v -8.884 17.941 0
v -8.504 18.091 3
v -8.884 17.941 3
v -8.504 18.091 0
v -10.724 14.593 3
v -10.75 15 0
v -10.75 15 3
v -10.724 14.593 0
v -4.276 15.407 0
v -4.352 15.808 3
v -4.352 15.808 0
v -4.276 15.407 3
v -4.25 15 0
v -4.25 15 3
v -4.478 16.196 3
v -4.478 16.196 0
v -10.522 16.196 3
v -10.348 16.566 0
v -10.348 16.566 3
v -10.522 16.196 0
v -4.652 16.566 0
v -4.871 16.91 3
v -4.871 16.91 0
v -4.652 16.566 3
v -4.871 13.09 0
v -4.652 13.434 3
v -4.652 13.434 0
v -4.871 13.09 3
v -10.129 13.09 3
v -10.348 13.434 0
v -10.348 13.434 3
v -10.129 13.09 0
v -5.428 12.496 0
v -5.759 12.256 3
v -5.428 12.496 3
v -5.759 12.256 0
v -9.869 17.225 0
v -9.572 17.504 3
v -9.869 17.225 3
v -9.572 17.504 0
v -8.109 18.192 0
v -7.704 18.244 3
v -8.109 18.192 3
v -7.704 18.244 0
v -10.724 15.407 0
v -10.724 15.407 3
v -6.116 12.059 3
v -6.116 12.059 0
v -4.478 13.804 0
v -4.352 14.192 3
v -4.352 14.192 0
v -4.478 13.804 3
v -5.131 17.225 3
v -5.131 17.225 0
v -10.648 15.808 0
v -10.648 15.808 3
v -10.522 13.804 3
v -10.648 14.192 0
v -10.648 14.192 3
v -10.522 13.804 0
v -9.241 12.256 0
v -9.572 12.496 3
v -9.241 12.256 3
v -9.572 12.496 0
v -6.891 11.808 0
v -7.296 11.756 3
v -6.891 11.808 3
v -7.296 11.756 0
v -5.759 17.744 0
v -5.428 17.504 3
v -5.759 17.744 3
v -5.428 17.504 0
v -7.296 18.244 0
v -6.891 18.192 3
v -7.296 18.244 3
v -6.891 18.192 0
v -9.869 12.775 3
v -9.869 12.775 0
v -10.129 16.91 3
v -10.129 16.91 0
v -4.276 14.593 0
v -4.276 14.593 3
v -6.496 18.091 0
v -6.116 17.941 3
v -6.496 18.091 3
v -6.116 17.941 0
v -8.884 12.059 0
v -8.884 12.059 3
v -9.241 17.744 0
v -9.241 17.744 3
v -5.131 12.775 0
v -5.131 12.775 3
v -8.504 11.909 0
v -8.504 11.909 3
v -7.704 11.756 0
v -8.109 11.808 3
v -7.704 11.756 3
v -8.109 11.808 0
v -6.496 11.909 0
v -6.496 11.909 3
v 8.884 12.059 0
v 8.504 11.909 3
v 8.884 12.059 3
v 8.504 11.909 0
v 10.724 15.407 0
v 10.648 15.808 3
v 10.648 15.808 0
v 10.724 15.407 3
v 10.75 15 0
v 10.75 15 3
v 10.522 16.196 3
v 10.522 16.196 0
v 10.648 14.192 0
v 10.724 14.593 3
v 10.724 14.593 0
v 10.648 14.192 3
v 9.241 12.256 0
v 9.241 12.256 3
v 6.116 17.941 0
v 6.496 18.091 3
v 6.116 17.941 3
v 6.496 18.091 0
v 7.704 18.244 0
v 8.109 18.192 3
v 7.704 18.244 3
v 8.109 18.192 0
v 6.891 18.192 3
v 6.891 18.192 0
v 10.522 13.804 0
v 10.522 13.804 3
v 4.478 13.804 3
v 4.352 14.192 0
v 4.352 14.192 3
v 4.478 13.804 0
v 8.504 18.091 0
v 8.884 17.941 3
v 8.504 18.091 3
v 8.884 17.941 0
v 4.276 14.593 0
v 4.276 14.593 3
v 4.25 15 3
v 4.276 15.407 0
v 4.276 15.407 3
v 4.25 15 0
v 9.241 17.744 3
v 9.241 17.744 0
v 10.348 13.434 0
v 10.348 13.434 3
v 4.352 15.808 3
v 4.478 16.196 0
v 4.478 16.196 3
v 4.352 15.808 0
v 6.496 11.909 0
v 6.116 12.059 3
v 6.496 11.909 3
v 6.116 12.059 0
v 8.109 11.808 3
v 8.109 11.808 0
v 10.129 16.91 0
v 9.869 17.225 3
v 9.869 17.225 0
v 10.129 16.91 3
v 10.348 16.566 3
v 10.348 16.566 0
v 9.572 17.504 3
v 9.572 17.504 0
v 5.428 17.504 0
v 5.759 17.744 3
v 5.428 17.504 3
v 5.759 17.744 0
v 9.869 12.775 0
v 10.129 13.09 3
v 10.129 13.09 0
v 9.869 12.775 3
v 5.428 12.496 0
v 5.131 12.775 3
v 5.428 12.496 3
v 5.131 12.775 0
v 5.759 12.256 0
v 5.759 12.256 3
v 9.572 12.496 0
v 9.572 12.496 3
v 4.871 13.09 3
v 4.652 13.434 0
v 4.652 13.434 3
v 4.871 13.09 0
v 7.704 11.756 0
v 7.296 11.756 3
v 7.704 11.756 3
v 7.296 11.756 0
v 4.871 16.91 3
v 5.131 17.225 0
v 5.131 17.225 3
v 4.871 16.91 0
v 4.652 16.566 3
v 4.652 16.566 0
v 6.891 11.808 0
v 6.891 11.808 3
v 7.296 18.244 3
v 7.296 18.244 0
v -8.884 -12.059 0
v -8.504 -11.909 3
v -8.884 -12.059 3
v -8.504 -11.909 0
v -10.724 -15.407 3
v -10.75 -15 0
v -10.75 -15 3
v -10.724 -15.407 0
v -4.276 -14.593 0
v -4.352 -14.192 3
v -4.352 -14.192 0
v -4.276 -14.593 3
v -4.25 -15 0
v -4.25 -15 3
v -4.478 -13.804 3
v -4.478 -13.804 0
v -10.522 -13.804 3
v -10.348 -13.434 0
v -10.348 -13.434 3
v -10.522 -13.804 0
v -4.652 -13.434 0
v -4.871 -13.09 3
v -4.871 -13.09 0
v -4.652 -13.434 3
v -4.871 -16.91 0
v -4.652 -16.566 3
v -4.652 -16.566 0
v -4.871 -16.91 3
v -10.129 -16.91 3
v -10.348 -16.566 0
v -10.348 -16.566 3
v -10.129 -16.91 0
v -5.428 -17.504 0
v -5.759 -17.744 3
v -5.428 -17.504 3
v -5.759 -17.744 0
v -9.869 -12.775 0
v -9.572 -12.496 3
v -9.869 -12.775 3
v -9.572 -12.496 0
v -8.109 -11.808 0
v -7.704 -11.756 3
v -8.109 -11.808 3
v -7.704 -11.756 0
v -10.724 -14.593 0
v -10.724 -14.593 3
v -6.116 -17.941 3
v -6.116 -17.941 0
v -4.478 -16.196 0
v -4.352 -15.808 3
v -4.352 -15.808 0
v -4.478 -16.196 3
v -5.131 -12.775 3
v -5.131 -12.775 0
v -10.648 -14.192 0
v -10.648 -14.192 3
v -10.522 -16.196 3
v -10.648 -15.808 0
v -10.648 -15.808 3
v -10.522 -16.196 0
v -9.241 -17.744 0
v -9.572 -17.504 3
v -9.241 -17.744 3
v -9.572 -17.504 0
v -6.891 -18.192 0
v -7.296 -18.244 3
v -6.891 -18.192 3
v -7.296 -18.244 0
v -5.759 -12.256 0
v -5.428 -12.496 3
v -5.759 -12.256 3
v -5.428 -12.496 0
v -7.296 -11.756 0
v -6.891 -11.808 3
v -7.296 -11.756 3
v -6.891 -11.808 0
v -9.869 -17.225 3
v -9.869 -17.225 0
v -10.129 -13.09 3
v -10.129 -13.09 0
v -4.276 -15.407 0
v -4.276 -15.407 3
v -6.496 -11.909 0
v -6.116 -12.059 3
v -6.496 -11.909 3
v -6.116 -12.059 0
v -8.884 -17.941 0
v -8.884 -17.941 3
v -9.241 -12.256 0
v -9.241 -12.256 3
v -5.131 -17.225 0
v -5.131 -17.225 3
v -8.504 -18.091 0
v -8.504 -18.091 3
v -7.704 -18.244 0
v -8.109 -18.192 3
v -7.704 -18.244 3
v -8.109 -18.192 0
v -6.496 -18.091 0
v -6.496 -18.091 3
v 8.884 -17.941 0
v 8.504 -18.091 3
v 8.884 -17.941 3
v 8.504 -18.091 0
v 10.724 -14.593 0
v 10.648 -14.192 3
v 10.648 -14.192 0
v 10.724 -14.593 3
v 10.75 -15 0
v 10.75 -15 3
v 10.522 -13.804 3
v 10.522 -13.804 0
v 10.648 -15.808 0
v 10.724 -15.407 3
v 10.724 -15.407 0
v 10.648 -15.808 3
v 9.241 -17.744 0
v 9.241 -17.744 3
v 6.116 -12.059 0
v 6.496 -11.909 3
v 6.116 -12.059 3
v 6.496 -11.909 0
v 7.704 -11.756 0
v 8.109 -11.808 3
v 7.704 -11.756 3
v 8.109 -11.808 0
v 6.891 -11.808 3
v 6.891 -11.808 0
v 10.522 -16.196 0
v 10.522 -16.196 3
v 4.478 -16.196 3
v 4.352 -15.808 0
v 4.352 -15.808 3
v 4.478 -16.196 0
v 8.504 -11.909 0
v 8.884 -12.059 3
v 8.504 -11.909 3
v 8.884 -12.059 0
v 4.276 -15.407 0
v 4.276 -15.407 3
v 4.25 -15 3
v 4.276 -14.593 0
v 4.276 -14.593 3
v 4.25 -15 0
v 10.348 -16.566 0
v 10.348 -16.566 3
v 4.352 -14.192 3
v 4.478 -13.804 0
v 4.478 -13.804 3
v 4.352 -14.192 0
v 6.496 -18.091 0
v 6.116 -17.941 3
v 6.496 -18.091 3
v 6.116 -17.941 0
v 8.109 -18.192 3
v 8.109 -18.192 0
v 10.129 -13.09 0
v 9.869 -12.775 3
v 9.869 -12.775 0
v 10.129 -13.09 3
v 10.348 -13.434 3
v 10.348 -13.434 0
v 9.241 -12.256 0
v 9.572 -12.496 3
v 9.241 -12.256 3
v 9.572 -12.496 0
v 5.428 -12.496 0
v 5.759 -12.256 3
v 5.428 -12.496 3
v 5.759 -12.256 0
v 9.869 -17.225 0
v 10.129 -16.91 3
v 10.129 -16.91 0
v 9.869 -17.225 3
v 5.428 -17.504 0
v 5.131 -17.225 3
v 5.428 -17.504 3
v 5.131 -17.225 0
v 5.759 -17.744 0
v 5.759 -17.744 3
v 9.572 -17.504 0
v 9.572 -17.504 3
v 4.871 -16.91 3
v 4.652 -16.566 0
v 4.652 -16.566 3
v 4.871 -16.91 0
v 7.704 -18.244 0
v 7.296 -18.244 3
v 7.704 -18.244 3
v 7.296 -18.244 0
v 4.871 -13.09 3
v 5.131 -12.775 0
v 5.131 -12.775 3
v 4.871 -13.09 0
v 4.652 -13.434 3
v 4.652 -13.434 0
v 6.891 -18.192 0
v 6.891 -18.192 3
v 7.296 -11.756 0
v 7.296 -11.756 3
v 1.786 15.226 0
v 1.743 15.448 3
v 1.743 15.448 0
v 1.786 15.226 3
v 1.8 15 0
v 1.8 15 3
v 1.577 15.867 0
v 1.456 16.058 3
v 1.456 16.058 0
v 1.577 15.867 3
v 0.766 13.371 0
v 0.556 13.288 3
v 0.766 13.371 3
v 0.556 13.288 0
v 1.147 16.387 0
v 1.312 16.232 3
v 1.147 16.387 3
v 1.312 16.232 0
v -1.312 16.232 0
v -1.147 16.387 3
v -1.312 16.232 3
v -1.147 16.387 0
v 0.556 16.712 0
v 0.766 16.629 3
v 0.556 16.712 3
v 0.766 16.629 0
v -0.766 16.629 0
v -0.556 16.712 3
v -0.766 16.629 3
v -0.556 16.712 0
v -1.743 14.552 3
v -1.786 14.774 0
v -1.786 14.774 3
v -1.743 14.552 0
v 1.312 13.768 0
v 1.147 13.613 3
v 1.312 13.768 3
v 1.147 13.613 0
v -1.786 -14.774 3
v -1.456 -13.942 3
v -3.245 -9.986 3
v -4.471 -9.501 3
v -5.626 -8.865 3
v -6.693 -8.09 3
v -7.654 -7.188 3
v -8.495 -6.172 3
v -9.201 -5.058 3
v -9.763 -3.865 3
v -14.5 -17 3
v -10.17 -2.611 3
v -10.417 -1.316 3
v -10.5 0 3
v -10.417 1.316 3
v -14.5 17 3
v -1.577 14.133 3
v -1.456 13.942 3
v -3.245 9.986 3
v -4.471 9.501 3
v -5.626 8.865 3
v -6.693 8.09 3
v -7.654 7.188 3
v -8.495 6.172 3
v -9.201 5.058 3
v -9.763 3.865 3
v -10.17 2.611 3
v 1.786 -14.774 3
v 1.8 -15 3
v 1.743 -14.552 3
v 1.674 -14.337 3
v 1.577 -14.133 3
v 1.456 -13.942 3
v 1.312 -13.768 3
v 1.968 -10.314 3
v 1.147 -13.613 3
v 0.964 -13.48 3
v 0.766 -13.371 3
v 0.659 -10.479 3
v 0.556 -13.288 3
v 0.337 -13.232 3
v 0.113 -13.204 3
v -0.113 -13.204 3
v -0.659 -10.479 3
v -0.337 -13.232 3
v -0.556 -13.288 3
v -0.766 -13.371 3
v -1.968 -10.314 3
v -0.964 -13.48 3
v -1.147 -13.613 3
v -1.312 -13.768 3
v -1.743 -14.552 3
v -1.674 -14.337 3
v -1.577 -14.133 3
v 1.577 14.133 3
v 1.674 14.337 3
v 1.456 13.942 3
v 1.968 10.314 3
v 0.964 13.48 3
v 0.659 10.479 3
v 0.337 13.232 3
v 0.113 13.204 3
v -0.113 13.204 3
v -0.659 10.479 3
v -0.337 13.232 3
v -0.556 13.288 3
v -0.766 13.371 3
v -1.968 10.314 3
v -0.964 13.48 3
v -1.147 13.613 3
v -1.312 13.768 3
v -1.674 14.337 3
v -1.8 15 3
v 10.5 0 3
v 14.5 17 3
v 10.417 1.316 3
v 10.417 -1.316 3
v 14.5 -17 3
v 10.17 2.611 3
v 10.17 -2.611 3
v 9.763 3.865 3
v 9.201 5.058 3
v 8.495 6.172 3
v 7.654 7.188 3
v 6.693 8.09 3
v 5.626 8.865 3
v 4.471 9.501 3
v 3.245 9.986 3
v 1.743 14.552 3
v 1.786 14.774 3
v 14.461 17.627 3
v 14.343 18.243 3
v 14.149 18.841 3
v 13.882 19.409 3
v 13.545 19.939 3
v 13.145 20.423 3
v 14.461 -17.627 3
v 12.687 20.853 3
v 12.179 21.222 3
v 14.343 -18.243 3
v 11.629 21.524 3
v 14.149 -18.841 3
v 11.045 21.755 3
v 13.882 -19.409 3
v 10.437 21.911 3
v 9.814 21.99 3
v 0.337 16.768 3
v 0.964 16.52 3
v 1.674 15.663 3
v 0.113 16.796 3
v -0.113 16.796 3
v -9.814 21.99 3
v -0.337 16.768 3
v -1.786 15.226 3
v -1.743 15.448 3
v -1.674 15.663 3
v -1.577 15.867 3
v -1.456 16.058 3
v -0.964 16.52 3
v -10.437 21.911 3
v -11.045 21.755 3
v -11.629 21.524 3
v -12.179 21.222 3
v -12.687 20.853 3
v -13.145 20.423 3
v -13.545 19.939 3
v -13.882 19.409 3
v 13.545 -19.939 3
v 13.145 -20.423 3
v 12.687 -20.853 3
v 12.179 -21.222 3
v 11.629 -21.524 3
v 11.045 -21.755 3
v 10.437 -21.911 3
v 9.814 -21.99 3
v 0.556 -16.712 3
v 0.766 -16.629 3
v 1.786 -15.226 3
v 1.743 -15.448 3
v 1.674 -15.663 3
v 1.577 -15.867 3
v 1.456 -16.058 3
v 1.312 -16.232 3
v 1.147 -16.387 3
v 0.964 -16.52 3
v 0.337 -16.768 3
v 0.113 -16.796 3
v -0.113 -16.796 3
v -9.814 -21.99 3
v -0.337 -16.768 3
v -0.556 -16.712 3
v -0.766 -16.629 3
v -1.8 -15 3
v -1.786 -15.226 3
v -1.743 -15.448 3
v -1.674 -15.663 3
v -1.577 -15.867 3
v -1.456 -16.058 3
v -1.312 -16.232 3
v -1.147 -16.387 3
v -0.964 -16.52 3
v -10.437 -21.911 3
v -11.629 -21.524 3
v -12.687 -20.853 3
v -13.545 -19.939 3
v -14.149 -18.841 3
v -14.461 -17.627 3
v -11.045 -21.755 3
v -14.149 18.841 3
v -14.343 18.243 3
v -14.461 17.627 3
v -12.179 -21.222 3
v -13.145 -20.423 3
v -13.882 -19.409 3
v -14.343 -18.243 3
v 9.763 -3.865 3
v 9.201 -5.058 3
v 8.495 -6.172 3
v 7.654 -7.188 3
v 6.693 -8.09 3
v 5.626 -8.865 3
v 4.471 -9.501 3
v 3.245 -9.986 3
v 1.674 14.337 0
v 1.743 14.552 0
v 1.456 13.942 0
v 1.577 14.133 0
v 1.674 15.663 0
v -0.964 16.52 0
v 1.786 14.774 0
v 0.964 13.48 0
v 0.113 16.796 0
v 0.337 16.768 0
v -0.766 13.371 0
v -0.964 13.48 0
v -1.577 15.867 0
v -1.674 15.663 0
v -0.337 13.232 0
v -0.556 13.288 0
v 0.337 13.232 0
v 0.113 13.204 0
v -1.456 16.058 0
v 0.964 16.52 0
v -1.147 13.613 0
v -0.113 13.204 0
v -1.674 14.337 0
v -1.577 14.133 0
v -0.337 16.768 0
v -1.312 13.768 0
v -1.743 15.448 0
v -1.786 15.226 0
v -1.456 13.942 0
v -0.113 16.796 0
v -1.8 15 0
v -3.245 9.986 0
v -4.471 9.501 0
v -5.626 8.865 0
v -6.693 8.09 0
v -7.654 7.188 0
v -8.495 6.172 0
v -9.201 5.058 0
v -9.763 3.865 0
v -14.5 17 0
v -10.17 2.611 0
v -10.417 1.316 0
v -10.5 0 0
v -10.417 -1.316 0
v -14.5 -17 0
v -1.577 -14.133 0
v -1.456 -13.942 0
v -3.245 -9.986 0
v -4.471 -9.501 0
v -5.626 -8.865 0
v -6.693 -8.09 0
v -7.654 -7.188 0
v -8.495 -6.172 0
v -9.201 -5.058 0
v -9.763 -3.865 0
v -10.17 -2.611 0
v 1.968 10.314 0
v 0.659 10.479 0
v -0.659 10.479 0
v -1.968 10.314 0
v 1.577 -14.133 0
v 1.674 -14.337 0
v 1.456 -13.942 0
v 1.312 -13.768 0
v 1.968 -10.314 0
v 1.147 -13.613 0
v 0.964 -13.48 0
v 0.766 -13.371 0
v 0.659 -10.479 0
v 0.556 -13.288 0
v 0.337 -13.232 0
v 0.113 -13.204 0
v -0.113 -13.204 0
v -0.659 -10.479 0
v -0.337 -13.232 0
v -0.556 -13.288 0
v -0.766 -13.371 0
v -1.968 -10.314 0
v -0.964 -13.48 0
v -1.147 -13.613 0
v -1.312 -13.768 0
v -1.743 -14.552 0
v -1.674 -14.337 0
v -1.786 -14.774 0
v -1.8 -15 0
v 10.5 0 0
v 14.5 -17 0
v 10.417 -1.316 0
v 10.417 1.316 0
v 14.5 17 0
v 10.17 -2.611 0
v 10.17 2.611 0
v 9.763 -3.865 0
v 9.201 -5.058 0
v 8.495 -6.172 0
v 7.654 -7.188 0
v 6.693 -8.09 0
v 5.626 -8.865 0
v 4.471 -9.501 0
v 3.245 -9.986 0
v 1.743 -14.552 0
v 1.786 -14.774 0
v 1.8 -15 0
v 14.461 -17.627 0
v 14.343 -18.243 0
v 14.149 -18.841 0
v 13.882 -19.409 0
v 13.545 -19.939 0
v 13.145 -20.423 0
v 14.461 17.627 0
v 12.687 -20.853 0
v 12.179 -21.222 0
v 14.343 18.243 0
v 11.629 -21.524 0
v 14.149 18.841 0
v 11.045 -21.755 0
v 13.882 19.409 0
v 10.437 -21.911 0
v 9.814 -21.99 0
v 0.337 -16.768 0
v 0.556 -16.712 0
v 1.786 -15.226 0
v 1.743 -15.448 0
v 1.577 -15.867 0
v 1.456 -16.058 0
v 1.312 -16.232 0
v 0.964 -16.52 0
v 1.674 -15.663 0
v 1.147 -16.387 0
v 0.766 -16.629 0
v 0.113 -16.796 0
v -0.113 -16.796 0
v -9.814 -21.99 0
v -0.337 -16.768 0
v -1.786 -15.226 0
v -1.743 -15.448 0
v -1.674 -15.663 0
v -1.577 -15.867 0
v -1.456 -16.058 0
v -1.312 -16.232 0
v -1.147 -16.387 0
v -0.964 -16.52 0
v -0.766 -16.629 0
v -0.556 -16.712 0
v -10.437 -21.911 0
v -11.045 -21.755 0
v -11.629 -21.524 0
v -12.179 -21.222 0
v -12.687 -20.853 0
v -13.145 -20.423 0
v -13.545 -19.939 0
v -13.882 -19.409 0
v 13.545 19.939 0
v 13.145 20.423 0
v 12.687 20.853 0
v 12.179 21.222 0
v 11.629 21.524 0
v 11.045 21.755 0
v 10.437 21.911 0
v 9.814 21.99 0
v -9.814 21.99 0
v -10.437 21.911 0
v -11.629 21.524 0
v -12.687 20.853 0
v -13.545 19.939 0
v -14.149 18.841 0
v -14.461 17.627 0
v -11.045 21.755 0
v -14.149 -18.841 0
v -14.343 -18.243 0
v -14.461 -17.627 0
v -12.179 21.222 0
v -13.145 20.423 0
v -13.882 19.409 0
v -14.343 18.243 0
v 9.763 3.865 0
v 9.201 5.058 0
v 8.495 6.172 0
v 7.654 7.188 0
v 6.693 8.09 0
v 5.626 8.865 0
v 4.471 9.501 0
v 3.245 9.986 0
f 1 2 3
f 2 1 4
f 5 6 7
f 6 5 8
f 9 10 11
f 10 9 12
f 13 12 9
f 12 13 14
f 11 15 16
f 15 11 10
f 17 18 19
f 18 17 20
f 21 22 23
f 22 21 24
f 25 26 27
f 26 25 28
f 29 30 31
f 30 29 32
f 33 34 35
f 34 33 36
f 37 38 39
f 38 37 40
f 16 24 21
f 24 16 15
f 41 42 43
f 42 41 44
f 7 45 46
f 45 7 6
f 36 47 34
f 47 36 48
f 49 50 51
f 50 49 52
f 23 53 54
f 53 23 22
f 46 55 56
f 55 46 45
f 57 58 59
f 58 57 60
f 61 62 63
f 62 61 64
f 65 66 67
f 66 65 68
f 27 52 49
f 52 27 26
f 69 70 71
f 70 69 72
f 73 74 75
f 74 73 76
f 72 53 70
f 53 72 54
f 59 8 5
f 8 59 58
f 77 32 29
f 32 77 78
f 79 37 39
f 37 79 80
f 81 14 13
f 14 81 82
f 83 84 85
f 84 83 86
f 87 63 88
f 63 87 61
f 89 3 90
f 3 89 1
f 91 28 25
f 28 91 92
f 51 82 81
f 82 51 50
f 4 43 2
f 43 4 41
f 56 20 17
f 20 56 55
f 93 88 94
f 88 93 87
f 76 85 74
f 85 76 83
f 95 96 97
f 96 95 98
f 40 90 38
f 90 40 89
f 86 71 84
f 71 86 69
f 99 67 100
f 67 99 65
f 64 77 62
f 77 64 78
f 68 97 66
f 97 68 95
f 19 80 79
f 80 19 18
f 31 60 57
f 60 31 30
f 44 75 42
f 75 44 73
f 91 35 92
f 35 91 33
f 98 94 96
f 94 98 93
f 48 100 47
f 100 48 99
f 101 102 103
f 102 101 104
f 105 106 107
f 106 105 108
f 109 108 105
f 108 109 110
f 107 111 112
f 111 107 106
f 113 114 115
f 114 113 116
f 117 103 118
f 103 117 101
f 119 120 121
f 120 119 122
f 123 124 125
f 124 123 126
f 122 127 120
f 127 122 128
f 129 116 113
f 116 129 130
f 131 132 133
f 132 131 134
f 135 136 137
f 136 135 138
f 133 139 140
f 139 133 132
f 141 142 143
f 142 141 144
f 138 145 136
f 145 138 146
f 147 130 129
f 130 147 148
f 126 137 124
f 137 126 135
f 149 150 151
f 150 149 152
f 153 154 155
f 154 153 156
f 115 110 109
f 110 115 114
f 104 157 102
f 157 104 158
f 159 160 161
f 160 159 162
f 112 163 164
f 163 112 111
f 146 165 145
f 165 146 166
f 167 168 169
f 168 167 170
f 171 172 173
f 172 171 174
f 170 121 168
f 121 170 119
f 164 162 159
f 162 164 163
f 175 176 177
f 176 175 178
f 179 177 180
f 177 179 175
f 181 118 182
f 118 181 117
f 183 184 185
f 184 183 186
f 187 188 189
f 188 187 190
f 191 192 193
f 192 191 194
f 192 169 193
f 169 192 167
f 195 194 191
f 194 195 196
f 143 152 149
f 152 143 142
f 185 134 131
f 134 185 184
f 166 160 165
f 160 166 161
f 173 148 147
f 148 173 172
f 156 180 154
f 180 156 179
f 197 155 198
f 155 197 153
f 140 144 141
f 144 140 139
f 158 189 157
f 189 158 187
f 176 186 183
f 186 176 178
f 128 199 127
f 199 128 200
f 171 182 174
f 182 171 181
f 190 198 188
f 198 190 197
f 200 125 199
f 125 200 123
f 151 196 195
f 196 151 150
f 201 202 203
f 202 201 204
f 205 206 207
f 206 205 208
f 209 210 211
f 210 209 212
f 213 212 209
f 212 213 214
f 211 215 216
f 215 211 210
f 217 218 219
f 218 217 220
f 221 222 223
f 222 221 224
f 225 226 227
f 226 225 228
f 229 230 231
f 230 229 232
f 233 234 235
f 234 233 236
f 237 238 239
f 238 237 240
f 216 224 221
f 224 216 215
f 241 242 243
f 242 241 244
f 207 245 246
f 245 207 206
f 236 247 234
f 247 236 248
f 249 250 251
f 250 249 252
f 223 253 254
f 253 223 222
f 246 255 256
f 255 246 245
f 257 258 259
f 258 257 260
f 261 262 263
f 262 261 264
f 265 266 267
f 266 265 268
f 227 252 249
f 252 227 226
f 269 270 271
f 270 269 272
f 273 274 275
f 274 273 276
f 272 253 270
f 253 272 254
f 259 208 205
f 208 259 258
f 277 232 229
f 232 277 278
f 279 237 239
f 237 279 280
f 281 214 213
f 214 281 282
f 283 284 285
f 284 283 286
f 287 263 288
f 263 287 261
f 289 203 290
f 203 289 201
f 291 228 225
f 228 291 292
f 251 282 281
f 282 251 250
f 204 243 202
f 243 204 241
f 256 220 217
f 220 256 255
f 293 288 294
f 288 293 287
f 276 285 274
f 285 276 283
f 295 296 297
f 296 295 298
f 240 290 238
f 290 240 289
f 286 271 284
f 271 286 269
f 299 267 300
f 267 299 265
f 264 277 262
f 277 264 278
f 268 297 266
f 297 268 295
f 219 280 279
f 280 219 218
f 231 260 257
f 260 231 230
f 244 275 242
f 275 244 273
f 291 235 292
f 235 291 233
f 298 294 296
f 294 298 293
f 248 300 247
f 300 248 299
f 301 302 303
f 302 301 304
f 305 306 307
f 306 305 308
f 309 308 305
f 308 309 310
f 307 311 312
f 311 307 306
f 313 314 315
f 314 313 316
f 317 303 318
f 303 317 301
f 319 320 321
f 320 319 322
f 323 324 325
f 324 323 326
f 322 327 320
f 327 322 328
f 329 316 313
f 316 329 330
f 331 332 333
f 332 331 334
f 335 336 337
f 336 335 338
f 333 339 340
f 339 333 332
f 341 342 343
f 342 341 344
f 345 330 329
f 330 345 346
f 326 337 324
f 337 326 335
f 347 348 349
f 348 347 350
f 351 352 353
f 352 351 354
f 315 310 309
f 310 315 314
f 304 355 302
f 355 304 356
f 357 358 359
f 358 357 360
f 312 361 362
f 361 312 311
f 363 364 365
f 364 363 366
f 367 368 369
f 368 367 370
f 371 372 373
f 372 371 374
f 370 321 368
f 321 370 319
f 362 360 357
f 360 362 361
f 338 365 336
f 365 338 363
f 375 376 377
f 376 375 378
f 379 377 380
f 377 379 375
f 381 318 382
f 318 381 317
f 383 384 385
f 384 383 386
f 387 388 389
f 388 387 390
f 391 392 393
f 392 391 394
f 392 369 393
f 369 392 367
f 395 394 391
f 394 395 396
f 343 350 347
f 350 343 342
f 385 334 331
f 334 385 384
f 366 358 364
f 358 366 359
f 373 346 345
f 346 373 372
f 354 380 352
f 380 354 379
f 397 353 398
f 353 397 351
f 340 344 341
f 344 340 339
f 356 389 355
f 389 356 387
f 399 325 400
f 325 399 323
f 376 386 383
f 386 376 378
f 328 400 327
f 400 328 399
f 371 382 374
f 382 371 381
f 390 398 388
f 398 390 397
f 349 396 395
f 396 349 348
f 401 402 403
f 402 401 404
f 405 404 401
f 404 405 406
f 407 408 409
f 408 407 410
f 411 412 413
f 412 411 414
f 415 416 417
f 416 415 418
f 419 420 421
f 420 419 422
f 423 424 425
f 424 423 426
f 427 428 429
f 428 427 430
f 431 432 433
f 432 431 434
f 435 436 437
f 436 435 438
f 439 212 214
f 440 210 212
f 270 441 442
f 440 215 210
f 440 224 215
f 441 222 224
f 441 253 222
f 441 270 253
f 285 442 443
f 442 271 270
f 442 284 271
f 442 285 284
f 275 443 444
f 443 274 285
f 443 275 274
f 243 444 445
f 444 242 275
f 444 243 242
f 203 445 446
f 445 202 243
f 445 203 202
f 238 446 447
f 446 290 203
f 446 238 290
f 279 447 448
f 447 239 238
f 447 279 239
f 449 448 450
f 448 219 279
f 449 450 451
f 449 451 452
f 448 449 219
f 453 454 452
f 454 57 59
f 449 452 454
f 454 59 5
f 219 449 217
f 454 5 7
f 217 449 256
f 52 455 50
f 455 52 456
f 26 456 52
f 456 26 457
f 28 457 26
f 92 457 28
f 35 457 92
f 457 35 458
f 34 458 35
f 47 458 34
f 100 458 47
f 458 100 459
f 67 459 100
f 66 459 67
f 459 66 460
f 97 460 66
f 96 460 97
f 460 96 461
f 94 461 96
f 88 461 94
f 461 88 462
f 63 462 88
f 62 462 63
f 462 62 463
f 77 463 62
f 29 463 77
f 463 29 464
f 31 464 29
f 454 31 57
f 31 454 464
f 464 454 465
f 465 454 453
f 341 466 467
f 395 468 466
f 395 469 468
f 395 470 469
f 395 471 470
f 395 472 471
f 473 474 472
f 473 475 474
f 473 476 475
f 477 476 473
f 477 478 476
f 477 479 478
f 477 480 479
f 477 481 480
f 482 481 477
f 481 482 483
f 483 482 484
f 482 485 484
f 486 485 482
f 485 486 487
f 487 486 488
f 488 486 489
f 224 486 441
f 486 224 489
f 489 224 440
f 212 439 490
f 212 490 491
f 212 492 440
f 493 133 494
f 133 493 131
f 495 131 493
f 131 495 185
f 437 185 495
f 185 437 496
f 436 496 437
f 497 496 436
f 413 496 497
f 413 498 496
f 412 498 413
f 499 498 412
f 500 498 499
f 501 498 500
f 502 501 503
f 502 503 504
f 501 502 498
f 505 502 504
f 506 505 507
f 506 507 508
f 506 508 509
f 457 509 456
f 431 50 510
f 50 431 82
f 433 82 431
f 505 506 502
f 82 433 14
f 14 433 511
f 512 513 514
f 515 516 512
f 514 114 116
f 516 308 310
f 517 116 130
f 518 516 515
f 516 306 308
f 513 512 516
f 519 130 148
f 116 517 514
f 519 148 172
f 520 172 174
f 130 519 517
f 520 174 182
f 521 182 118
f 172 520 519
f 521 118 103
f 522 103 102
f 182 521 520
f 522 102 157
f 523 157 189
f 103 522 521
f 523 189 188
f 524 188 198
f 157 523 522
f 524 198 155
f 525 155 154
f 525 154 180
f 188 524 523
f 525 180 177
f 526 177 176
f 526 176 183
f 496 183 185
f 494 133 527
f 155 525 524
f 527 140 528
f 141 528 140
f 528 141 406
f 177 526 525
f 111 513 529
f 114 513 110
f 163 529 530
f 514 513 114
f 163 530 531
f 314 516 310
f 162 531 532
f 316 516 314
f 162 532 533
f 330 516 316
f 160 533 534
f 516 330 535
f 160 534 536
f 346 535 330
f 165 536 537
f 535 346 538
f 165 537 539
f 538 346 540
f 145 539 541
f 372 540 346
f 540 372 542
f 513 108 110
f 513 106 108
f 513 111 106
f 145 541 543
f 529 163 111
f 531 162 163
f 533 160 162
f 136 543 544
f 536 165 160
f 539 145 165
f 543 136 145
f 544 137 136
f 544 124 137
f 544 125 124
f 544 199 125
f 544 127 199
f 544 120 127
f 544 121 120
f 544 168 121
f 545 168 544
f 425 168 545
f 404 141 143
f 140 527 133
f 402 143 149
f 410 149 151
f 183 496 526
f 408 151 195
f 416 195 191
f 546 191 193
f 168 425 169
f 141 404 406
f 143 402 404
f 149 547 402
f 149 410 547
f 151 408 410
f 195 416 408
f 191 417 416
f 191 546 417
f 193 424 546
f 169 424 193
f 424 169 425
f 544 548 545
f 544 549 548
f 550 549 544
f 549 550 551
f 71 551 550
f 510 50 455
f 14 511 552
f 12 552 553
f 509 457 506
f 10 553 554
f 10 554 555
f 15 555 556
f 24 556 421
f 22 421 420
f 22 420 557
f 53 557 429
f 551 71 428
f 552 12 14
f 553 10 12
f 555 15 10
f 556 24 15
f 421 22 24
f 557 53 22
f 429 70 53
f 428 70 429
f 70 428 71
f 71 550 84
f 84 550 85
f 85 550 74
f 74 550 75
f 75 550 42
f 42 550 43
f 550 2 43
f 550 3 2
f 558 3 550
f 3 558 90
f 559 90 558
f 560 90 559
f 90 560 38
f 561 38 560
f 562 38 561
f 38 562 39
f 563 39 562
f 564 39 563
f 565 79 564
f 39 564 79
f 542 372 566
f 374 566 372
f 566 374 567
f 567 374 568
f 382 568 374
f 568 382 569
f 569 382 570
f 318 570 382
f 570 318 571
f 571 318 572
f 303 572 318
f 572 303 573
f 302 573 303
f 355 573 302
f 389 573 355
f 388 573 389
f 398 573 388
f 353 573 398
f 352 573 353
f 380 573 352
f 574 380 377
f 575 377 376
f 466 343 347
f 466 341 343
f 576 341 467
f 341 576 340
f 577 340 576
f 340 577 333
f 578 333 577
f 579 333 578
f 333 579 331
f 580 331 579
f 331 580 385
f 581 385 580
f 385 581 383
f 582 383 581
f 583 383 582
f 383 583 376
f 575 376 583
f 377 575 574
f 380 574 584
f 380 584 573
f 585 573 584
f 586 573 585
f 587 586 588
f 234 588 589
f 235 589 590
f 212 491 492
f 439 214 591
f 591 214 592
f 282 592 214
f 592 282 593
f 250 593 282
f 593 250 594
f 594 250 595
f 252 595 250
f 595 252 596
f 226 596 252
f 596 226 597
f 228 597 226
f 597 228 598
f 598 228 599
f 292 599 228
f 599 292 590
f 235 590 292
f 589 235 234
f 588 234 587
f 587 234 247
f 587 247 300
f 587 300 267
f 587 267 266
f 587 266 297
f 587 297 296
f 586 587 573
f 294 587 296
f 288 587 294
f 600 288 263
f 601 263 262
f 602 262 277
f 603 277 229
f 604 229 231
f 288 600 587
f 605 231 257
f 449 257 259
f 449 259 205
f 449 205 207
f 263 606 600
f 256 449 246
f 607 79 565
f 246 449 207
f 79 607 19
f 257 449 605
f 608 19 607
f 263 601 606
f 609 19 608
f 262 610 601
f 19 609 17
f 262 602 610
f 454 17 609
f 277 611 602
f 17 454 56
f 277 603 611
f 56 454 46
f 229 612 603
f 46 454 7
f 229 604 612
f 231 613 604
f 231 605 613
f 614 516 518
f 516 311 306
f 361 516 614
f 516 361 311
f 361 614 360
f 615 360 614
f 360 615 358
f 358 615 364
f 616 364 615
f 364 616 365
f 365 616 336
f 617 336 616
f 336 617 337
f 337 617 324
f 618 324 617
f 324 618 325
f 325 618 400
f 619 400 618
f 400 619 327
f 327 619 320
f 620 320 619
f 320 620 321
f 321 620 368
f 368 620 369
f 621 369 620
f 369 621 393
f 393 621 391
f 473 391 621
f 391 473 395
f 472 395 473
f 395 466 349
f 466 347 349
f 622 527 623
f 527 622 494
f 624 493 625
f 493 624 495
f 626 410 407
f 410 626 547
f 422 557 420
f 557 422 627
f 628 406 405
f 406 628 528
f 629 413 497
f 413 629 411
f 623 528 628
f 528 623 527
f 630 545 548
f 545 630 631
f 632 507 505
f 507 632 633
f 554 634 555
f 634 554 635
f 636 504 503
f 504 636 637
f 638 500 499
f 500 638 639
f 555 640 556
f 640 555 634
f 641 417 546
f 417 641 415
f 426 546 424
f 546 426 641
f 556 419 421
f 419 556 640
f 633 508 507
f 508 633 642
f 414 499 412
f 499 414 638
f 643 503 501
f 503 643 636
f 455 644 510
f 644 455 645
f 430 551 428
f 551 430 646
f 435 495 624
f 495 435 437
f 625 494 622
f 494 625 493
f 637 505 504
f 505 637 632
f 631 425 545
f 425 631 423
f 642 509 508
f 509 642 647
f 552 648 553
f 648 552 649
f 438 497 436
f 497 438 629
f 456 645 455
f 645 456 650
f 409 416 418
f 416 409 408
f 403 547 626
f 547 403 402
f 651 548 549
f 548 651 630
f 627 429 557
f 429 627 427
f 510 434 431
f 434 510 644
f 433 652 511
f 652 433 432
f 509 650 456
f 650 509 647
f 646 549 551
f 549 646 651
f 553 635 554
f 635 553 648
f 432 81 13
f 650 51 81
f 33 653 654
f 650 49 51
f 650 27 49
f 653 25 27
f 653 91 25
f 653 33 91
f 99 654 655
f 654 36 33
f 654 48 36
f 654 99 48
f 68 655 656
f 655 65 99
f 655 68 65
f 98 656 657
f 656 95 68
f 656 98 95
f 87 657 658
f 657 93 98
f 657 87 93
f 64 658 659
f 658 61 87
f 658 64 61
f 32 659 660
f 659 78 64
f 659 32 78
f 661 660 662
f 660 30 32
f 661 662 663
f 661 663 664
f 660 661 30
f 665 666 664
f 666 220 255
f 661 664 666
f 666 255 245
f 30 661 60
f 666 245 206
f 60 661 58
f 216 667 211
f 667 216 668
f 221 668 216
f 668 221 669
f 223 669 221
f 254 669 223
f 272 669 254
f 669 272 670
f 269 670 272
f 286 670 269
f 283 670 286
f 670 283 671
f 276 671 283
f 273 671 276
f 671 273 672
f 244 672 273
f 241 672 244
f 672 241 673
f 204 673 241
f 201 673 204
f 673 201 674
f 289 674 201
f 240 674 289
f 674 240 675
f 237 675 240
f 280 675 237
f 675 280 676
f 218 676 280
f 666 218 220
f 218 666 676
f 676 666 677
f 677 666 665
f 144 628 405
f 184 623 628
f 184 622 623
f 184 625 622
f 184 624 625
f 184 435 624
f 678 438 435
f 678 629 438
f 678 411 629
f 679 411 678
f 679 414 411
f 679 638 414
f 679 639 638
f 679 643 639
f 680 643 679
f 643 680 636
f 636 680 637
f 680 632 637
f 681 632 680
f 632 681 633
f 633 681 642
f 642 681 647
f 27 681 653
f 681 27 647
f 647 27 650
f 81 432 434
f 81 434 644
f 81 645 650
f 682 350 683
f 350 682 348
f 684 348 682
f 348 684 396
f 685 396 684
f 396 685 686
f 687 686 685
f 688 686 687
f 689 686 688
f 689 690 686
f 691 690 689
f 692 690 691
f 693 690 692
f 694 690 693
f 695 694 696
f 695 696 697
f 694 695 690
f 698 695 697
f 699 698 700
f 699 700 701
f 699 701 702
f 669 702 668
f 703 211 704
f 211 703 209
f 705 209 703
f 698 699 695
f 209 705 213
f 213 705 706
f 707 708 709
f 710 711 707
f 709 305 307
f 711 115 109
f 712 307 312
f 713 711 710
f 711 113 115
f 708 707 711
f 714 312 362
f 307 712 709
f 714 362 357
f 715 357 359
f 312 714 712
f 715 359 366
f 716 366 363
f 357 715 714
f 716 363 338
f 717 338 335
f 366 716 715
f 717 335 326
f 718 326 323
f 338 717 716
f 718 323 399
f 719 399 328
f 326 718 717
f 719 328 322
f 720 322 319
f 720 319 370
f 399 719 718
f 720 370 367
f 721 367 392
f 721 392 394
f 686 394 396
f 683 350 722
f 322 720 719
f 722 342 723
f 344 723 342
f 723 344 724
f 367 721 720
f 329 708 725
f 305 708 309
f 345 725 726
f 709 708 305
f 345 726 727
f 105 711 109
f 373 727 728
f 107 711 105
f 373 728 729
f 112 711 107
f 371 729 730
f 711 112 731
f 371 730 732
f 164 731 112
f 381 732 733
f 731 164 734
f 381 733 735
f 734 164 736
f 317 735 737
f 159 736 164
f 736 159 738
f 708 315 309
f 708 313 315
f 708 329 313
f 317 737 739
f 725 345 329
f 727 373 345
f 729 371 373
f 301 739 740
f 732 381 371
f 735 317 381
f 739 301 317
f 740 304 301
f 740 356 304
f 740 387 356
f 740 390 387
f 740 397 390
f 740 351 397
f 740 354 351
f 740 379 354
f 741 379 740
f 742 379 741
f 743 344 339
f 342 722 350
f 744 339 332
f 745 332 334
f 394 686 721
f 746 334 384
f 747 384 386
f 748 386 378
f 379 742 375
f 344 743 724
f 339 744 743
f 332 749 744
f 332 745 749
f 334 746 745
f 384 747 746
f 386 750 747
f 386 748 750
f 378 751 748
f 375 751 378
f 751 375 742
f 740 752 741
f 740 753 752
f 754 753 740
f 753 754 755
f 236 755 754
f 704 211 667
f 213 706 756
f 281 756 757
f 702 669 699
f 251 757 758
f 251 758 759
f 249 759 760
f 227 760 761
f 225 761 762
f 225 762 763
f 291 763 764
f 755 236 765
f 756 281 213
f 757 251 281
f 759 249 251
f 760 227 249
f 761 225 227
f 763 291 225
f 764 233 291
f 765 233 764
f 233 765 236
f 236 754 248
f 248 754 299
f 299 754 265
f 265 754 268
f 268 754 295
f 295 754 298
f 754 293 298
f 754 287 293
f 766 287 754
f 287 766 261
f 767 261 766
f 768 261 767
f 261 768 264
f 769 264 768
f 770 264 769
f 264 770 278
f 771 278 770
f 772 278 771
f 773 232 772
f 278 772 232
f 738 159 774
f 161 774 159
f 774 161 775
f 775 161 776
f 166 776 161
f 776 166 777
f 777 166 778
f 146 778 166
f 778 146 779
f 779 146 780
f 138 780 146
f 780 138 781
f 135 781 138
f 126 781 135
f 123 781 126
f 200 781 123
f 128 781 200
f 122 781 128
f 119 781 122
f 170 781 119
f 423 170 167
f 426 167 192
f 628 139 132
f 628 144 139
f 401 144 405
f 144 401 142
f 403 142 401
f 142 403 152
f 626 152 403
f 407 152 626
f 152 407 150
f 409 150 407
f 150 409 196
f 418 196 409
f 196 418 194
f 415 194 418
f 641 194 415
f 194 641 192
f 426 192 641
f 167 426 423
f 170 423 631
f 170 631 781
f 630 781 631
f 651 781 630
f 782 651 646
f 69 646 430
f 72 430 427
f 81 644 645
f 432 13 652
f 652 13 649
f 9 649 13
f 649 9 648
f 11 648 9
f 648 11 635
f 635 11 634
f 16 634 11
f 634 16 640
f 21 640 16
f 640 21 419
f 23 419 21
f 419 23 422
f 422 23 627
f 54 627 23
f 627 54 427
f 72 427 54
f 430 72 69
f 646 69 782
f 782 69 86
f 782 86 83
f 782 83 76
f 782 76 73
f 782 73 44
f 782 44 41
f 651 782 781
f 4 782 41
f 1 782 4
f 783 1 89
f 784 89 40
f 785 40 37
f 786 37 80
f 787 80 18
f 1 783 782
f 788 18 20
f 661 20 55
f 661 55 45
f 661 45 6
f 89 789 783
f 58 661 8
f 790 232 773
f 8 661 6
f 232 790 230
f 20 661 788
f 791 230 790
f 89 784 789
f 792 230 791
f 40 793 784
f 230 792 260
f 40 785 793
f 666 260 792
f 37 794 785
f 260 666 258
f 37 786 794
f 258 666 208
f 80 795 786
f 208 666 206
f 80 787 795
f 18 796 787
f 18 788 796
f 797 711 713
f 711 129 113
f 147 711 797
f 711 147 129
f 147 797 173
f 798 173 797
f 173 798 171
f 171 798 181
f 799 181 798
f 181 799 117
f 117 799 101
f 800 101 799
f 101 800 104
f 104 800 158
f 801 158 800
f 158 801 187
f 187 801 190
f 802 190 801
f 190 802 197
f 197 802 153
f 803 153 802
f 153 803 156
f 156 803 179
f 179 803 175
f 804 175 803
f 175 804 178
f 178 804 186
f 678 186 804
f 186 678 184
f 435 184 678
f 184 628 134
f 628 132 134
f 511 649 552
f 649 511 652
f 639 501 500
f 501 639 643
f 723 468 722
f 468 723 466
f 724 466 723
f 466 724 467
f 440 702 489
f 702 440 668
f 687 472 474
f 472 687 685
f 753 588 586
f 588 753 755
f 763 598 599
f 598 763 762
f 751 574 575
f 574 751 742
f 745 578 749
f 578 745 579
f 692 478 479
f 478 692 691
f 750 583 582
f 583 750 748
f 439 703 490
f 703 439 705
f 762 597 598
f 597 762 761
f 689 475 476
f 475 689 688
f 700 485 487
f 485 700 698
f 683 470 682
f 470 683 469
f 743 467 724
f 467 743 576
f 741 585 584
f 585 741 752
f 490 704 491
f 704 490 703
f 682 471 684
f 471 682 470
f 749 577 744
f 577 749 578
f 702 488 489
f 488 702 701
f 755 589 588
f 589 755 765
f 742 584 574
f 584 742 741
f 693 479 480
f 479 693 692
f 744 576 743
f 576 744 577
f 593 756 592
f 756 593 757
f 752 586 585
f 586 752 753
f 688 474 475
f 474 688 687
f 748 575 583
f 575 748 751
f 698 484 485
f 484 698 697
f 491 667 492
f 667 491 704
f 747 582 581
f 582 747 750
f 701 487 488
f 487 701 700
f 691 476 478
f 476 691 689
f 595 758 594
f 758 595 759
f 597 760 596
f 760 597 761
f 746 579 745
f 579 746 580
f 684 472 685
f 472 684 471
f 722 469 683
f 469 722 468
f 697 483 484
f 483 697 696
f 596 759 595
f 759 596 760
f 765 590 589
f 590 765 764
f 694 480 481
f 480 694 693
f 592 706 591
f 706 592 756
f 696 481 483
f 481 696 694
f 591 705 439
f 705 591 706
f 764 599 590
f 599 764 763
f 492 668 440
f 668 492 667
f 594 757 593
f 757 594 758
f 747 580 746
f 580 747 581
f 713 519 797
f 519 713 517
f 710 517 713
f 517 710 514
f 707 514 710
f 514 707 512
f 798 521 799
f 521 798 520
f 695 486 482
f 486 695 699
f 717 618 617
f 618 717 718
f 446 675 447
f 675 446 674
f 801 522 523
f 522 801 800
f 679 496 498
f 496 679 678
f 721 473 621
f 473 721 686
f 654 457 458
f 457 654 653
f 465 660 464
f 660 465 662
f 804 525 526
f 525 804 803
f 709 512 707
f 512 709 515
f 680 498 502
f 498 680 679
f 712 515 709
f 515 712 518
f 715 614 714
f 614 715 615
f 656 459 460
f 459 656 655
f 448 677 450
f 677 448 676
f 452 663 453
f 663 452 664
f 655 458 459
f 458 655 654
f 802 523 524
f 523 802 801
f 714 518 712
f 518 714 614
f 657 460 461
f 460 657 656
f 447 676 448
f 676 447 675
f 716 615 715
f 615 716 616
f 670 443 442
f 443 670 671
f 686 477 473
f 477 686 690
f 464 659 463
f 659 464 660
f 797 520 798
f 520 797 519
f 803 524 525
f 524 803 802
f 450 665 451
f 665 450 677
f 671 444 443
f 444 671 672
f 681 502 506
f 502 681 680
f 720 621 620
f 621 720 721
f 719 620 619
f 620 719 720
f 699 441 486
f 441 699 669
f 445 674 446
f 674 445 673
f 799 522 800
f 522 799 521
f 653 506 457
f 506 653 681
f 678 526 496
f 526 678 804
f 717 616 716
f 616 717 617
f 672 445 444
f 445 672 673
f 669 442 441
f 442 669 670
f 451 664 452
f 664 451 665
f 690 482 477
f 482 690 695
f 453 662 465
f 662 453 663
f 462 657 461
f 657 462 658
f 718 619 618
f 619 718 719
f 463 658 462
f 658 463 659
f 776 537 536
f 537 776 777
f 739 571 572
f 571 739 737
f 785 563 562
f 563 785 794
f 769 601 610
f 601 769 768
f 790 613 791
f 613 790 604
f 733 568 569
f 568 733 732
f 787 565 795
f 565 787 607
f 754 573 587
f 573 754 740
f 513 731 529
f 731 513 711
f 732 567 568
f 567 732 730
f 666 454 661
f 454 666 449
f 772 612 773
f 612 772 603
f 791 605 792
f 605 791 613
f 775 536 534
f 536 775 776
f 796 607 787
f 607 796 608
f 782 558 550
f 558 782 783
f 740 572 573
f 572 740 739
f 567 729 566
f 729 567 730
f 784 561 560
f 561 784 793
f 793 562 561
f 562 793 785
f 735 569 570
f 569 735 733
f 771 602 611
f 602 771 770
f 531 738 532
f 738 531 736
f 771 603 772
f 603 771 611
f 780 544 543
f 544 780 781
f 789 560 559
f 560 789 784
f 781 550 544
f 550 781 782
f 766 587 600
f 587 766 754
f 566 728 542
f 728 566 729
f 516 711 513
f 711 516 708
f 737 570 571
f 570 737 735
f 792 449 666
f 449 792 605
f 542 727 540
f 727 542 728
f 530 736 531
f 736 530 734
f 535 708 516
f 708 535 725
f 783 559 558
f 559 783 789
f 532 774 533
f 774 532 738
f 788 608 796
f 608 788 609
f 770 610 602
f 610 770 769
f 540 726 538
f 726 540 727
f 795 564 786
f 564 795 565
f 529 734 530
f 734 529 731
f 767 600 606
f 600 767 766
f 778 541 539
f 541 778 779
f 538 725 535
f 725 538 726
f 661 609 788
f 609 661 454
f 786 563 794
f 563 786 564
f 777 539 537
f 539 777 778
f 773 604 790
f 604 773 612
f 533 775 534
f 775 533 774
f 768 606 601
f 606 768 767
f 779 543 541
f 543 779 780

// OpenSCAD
$fn = 50;


difference() {
	union() {
		hull() {
			translate(v = [-9.5000000000, 17.0000000000, 0]) {
				cylinder(h = 3, r = 5);
			}
			translate(v = [9.5000000000, 17.0000000000, 0]) {
				cylinder(h = 3, r = 5);
			}
			translate(v = [-9.5000000000, -17.0000000000, 0]) {
				cylinder(h = 3, r = 5);
			}
			translate(v = [9.5000000000, -17.0000000000, 0]) {
				cylinder(h = 3, r = 5);
			}
		}
	}
	union() {
		#translate(v = [-7.5000000000, 15.0000000000, 0]) {
			cylinder(h = 3, r = 3.2500000000);
		}
		#translate(v = [7.5000000000, 15.0000000000, 0]) {
			cylinder(h = 3, r = 3.2500000000);
		}
		#translate(v = [-7.5000000000, -15.0000000000, 0]) {
			cylinder(h = 3, r = 3.2500000000);
		}
		#translate(v = [7.5000000000, -15.0000000000, 0]) {
			cylinder(h = 3, r = 3.2500000000);
		}
		#translate(v = [-7.5000000000, -15.0000000000, -100.0000000000]) {
			cylinder(h = 200, r = 3.2500000000);
		}
		#translate(v = [-7.5000000000, 15.0000000000, -100.0000000000]) {
			cylinder(h = 200, r = 3.2500000000);
		}
		#translate(v = [7.5000000000, -15.0000000000, -100.0000000000]) {
			cylinder(h = 200, r = 3.2500000000);
		}
		#translate(v = [7.5000000000, 15.0000000000, -100.0000000000]) {
			cylinder(h = 200, r = 3.2500000000);
		}
		#translate(v = [-7.5000000000, 15.0000000000, 0]) {
			cylinder(h = 3, r = 1.8000000000);
		}
		#translate(v = [0.0000000000, 15.0000000000, 0]) {
			cylinder(h = 3, r = 1.8000000000);
		}
		#translate(v = [7.5000000000, 15.0000000000, 0]) {
			cylinder(h = 3, r = 1.8000000000);
		}
		#translate(v = [-7.5000000000, -15.0000000000, 0]) {
			cylinder(h = 3, r = 1.8000000000);
		}
		#translate(v = [0.0000000000, -15.0000000000, 0]) {
			cylinder(h = 3, r = 1.8000000000);
		}
		#translate(v = [7.5000000000, -15.0000000000, 0]) {
			cylinder(h = 3, r = 1.8000000000);
		}
		#translate(v = [-7.5000000000, 15.0000000000, 0]) {
			cylinder(h = 3, r = 1.8000000000);
		}
		#translate(v = [0.0000000000, 15.0000000000, 0]) {
			cylinder(h = 3, r = 1.8000000000);
		}
		#translate(v = [7.5000000000, 15.0000000000, 0]) {
			cylinder(h = 3, r = 1.8000000000);
		}
		#translate(v = [-7.5000000000, -15.0000000000, 0]) {
			cylinder(h = 3, r = 1.8000000000);
		}
		#translate(v = [0.0000000000, -15.0000000000, 0]) {
			cylinder(h = 3, r = 1.8000000000);
		}
		#translate(v = [7.5000000000, -15.0000000000, 0]) {
			cylinder(h = 3, r = 1.8000000000);
		}
		#translate(v = [-7.5000000000, 15.0000000000, 0]) {
			cylinder(h = 3, r = 1.8000000000);
		}
		#translate(v = [0.0000000000, 15.0000000000, 0]) {
			cylinder(h = 3, r = 1.8000000000);
		}
		#translate(v = [7.5000000000, 15.0000000000, 0]) {
			cylinder(h = 3, r = 1.8000000000);
		}
		#translate(v = [-7.5000000000, -15.0000000000, 0]) {
			cylinder(h = 3, r = 1.8000000000);
		}
		#translate(v = [0.0000000000, -15.0000000000, 0]) {
			cylinder(h = 3, r = 1.8000000000);
		}
		#translate(v = [7.5000000000, -15.0000000000, 0]) {
			cylinder(h = 3, r = 1.8000000000);
		}
		#cylinder(h = 3, r = 10.5000000000);
	}
}
